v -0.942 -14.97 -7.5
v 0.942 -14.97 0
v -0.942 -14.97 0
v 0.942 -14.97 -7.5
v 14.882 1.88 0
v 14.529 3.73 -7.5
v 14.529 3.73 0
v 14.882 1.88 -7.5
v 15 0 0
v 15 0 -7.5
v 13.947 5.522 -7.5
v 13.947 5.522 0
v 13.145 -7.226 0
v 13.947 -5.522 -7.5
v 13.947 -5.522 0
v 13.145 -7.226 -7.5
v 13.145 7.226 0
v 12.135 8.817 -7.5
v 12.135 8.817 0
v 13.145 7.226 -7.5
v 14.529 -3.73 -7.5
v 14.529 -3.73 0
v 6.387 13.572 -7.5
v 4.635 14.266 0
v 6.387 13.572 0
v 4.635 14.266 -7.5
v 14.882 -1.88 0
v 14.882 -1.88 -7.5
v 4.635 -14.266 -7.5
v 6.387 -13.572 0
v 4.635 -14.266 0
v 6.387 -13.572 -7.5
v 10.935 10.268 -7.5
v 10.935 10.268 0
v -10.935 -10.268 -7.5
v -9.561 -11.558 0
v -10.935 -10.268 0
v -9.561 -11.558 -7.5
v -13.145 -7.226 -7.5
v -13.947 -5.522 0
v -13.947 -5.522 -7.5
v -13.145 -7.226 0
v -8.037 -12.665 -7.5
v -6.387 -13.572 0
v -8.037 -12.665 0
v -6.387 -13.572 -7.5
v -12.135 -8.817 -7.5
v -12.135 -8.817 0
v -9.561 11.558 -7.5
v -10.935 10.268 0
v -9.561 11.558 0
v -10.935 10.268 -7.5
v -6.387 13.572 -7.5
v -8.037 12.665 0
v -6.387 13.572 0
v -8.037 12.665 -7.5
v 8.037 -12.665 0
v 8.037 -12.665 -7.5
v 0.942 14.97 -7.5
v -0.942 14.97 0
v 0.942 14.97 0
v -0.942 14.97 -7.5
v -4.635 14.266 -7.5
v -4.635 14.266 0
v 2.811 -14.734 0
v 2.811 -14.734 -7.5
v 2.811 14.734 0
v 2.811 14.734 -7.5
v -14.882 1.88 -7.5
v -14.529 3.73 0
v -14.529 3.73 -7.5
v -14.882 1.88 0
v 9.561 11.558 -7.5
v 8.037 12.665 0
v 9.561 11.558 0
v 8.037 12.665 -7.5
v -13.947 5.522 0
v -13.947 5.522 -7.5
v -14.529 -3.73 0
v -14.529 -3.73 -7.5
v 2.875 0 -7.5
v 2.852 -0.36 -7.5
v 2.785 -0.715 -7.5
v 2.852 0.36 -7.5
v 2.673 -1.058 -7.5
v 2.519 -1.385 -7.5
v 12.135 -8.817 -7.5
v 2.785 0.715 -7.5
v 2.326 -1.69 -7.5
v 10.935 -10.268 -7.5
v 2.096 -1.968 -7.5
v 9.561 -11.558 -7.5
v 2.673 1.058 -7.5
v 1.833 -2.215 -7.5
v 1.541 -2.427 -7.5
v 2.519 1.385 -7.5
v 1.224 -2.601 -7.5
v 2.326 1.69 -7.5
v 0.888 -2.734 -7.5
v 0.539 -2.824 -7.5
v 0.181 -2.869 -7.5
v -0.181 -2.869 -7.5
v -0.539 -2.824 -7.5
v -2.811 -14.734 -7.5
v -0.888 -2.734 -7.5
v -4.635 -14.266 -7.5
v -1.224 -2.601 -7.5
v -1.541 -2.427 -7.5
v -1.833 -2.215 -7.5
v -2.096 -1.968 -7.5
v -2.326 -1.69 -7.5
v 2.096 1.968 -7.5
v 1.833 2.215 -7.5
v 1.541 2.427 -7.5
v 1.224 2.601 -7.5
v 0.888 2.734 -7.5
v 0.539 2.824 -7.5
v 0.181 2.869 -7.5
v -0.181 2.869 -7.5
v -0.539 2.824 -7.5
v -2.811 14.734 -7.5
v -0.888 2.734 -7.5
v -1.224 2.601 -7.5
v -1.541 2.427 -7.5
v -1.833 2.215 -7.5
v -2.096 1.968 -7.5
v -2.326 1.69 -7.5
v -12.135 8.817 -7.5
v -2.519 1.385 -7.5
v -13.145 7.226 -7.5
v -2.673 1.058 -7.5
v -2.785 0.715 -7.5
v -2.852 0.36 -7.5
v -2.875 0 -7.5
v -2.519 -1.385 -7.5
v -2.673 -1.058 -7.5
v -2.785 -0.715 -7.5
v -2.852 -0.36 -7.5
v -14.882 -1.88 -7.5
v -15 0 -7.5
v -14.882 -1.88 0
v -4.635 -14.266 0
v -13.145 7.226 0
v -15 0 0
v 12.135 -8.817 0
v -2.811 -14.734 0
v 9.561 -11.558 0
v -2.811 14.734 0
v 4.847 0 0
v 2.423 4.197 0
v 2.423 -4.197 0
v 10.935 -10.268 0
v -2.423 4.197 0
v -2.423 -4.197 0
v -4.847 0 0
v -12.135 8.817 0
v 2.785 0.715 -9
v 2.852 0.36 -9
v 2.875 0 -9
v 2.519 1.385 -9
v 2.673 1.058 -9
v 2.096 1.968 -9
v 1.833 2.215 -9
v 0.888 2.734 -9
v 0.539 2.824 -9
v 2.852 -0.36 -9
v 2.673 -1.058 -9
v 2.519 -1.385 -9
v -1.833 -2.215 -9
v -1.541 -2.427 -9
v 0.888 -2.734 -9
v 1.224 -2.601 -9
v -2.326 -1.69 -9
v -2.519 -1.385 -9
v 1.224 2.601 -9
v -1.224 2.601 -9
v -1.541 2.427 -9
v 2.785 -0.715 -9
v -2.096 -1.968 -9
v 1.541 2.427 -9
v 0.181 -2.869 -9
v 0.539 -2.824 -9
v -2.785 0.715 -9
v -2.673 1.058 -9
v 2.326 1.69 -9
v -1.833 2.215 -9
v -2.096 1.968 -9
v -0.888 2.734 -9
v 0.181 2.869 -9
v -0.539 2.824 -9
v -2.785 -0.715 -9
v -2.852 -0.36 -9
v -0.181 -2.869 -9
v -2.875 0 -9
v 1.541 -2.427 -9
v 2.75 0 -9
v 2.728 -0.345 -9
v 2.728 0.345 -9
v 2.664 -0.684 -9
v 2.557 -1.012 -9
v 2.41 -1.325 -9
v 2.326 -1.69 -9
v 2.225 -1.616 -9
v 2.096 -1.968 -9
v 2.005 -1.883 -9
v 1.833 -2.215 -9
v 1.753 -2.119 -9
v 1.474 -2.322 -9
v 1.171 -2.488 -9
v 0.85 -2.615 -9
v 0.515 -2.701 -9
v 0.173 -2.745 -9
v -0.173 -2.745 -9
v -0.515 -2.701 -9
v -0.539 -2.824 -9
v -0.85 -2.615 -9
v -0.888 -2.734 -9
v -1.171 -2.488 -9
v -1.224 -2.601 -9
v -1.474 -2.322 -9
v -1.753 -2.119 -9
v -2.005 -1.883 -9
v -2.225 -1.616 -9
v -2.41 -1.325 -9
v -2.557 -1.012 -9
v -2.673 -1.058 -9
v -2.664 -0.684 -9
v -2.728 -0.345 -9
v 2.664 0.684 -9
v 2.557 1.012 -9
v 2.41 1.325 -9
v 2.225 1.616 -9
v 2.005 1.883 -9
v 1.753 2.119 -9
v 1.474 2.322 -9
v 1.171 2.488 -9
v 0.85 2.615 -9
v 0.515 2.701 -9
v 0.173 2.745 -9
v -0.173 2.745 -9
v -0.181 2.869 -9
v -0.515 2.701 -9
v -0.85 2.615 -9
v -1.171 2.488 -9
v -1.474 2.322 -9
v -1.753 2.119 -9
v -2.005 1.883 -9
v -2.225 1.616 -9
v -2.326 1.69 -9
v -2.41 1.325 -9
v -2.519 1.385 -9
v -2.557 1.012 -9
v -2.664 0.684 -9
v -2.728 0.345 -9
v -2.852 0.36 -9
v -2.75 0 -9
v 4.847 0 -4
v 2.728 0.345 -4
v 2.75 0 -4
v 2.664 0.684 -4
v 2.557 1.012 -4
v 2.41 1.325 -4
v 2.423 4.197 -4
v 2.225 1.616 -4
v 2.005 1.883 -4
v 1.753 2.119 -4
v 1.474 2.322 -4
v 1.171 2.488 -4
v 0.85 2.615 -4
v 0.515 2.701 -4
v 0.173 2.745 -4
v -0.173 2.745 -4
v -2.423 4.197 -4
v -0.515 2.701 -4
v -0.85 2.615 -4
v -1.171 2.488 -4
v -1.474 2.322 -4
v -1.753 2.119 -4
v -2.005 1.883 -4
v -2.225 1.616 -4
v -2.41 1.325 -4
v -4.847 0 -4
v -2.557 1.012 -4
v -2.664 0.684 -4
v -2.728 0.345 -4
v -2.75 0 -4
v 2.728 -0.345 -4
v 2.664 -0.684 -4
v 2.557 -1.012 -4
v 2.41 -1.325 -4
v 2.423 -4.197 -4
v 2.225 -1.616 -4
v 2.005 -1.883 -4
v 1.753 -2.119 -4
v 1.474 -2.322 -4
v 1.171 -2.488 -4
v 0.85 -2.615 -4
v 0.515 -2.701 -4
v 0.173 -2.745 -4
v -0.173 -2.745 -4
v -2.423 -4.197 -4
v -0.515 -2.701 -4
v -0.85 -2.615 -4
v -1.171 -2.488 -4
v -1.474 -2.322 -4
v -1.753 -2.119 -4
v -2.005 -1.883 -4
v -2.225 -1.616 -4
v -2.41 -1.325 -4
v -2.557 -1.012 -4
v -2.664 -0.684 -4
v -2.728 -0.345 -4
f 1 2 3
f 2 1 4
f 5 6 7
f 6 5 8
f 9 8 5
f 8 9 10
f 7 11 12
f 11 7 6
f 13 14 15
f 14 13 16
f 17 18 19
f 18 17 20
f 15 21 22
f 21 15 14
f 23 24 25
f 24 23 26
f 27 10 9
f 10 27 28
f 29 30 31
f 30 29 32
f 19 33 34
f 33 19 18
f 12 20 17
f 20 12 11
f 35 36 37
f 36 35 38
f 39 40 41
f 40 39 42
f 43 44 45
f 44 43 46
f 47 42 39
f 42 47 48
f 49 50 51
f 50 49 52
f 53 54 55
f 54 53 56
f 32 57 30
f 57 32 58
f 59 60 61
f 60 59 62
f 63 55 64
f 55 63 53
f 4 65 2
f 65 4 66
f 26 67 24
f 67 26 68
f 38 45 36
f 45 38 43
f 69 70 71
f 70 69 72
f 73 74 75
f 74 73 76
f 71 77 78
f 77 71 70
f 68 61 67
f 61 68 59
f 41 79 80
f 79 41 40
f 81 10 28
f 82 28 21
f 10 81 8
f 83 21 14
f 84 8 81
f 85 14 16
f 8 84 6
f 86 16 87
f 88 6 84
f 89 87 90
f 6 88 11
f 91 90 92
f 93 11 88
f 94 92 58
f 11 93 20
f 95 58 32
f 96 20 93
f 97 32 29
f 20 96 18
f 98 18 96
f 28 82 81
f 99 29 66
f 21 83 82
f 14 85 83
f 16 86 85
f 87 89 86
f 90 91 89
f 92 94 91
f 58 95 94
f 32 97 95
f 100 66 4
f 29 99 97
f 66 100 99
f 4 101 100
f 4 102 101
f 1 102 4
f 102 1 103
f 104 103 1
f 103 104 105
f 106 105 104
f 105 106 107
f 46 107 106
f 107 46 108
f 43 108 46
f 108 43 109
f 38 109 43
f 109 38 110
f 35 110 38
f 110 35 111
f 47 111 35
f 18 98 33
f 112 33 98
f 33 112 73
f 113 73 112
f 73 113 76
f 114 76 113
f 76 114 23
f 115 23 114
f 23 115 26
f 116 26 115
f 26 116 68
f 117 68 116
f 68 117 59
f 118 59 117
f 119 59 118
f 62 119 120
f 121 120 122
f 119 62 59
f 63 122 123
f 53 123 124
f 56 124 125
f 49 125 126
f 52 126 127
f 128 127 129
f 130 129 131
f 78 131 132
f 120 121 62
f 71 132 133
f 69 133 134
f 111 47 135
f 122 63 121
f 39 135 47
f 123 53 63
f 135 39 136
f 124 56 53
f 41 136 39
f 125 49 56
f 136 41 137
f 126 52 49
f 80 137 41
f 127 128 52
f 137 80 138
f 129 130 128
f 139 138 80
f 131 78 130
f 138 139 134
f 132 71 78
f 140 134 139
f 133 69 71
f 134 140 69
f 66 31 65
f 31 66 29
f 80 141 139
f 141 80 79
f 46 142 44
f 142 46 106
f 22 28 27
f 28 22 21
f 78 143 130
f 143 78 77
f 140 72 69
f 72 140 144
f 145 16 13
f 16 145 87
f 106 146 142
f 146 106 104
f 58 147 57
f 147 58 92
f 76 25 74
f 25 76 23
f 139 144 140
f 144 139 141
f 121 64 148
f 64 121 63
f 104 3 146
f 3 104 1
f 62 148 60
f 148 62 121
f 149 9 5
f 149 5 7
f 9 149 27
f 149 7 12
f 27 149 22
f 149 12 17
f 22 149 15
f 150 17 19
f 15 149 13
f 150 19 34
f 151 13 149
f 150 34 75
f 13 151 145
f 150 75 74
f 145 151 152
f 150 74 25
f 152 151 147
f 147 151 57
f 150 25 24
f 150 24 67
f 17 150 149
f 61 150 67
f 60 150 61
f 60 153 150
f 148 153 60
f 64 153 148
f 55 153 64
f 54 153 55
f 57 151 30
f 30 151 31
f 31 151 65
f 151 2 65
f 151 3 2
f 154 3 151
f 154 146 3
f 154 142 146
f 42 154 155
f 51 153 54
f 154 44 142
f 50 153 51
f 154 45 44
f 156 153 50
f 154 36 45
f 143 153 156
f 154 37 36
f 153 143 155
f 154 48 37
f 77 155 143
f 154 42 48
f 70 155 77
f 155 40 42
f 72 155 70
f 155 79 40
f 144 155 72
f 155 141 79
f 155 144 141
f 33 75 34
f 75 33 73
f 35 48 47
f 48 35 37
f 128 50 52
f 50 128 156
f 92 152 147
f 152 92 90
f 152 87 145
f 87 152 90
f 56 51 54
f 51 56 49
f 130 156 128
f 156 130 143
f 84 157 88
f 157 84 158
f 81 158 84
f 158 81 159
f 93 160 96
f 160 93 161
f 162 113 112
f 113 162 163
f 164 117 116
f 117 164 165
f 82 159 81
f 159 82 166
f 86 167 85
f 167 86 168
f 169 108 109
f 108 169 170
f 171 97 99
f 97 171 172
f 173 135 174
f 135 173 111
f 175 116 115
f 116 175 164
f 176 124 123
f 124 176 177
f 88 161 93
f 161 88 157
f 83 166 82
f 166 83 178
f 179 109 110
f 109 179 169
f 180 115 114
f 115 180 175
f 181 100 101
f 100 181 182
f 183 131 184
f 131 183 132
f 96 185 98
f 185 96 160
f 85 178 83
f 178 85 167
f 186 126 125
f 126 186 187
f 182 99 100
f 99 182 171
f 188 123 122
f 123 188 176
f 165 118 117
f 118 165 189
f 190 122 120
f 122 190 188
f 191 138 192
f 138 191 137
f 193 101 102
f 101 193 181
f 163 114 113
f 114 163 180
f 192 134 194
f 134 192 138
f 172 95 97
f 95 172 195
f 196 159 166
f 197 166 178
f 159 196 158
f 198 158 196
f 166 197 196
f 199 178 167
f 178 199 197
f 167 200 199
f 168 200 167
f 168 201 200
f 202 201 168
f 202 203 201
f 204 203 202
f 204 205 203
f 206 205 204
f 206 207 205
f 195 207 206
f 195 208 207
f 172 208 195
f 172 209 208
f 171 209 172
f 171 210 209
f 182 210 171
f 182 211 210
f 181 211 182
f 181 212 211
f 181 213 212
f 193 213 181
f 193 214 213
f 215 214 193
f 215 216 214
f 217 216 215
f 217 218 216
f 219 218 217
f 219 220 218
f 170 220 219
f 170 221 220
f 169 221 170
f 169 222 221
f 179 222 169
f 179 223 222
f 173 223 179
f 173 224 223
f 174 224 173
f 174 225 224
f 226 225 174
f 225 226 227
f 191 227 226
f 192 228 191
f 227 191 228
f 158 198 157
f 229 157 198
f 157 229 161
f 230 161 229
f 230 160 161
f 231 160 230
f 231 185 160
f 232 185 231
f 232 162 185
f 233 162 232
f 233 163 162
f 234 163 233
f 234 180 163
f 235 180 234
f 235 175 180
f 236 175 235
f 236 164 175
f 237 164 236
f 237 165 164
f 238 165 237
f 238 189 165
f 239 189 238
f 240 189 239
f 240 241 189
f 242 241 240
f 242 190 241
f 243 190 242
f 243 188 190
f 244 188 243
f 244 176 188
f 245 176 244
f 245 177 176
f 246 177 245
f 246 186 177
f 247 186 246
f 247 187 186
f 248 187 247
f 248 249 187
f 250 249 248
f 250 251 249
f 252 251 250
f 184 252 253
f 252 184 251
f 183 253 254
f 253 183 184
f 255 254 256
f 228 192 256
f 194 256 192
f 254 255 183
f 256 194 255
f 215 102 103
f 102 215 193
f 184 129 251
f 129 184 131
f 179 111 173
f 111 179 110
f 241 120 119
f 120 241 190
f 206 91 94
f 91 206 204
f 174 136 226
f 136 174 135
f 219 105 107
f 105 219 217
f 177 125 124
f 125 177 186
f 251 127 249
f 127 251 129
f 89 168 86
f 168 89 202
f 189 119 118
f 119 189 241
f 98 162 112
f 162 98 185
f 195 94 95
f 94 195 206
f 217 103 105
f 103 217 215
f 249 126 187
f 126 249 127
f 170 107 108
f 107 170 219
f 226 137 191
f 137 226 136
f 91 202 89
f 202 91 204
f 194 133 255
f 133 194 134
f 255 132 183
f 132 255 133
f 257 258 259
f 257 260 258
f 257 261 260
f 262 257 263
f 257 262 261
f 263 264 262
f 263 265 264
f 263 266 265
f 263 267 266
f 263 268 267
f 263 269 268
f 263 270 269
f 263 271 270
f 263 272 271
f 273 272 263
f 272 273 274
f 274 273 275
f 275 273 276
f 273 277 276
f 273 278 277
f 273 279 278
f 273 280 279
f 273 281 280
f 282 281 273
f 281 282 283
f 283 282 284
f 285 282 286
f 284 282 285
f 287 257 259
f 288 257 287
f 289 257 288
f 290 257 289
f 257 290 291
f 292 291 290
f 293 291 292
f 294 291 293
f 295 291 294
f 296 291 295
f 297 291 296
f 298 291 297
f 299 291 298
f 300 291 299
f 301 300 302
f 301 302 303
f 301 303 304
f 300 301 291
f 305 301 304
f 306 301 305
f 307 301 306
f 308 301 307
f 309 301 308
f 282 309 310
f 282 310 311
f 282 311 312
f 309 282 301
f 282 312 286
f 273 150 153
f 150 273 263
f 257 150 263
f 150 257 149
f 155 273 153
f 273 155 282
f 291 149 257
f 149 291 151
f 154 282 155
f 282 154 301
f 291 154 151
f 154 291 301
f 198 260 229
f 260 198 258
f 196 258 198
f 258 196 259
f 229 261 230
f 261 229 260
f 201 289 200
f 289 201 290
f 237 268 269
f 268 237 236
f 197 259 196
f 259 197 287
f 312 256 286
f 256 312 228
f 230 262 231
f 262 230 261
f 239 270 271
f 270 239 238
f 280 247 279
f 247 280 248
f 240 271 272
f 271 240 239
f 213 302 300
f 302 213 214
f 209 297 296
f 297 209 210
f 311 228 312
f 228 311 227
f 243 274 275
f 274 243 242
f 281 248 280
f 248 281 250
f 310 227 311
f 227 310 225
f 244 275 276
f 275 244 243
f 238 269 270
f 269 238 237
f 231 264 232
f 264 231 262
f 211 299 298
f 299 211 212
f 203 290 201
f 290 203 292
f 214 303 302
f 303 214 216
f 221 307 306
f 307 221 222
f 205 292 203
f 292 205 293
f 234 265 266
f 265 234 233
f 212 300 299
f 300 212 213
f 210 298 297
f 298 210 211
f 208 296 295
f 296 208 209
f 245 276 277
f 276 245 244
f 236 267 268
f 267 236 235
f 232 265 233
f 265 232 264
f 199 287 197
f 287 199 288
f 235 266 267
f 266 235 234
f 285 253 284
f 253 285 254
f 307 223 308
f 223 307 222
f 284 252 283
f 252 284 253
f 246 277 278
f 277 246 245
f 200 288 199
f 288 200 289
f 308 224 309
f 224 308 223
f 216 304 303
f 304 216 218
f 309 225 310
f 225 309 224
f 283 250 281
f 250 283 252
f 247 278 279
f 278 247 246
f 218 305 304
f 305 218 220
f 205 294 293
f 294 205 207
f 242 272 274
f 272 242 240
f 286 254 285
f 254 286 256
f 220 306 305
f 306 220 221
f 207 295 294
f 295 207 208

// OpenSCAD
$fn = 50;

difference() {
	union() {
		translate(v = [0, 0, -7.5]) {
			cylinder(h = 7.5, r = 15.0);
		}
		#translate(v = [0, 0, -9.0]) {
			cylinder(h = 9, r = 2.875);
		}
	}
	union() {
		translate(v = [0, 0, 0]) {
			rotate(a = [0, 0, 0]) {
				difference() {
					union() {
						translate(v = [0, 0, -4]) {
							linear_extrude(height = 4) {
								polygon(points = [[4.8468, 0.0], [2.4234000000000004, 4.197451927062417], [-2.423399999999999, 4.197451927062417], [-4.8468, 5.935618106107392e-16], [-2.423400000000002, -4.197451927062416], [2.423399999999997, -4.197451927062419]]);
							}
						}
					}
					union();
				}
			}
		}
		#translate(v = [0, 0, -100.0]) {
			cylinder(h = 200, r = 2.75);
		}
	}
}
